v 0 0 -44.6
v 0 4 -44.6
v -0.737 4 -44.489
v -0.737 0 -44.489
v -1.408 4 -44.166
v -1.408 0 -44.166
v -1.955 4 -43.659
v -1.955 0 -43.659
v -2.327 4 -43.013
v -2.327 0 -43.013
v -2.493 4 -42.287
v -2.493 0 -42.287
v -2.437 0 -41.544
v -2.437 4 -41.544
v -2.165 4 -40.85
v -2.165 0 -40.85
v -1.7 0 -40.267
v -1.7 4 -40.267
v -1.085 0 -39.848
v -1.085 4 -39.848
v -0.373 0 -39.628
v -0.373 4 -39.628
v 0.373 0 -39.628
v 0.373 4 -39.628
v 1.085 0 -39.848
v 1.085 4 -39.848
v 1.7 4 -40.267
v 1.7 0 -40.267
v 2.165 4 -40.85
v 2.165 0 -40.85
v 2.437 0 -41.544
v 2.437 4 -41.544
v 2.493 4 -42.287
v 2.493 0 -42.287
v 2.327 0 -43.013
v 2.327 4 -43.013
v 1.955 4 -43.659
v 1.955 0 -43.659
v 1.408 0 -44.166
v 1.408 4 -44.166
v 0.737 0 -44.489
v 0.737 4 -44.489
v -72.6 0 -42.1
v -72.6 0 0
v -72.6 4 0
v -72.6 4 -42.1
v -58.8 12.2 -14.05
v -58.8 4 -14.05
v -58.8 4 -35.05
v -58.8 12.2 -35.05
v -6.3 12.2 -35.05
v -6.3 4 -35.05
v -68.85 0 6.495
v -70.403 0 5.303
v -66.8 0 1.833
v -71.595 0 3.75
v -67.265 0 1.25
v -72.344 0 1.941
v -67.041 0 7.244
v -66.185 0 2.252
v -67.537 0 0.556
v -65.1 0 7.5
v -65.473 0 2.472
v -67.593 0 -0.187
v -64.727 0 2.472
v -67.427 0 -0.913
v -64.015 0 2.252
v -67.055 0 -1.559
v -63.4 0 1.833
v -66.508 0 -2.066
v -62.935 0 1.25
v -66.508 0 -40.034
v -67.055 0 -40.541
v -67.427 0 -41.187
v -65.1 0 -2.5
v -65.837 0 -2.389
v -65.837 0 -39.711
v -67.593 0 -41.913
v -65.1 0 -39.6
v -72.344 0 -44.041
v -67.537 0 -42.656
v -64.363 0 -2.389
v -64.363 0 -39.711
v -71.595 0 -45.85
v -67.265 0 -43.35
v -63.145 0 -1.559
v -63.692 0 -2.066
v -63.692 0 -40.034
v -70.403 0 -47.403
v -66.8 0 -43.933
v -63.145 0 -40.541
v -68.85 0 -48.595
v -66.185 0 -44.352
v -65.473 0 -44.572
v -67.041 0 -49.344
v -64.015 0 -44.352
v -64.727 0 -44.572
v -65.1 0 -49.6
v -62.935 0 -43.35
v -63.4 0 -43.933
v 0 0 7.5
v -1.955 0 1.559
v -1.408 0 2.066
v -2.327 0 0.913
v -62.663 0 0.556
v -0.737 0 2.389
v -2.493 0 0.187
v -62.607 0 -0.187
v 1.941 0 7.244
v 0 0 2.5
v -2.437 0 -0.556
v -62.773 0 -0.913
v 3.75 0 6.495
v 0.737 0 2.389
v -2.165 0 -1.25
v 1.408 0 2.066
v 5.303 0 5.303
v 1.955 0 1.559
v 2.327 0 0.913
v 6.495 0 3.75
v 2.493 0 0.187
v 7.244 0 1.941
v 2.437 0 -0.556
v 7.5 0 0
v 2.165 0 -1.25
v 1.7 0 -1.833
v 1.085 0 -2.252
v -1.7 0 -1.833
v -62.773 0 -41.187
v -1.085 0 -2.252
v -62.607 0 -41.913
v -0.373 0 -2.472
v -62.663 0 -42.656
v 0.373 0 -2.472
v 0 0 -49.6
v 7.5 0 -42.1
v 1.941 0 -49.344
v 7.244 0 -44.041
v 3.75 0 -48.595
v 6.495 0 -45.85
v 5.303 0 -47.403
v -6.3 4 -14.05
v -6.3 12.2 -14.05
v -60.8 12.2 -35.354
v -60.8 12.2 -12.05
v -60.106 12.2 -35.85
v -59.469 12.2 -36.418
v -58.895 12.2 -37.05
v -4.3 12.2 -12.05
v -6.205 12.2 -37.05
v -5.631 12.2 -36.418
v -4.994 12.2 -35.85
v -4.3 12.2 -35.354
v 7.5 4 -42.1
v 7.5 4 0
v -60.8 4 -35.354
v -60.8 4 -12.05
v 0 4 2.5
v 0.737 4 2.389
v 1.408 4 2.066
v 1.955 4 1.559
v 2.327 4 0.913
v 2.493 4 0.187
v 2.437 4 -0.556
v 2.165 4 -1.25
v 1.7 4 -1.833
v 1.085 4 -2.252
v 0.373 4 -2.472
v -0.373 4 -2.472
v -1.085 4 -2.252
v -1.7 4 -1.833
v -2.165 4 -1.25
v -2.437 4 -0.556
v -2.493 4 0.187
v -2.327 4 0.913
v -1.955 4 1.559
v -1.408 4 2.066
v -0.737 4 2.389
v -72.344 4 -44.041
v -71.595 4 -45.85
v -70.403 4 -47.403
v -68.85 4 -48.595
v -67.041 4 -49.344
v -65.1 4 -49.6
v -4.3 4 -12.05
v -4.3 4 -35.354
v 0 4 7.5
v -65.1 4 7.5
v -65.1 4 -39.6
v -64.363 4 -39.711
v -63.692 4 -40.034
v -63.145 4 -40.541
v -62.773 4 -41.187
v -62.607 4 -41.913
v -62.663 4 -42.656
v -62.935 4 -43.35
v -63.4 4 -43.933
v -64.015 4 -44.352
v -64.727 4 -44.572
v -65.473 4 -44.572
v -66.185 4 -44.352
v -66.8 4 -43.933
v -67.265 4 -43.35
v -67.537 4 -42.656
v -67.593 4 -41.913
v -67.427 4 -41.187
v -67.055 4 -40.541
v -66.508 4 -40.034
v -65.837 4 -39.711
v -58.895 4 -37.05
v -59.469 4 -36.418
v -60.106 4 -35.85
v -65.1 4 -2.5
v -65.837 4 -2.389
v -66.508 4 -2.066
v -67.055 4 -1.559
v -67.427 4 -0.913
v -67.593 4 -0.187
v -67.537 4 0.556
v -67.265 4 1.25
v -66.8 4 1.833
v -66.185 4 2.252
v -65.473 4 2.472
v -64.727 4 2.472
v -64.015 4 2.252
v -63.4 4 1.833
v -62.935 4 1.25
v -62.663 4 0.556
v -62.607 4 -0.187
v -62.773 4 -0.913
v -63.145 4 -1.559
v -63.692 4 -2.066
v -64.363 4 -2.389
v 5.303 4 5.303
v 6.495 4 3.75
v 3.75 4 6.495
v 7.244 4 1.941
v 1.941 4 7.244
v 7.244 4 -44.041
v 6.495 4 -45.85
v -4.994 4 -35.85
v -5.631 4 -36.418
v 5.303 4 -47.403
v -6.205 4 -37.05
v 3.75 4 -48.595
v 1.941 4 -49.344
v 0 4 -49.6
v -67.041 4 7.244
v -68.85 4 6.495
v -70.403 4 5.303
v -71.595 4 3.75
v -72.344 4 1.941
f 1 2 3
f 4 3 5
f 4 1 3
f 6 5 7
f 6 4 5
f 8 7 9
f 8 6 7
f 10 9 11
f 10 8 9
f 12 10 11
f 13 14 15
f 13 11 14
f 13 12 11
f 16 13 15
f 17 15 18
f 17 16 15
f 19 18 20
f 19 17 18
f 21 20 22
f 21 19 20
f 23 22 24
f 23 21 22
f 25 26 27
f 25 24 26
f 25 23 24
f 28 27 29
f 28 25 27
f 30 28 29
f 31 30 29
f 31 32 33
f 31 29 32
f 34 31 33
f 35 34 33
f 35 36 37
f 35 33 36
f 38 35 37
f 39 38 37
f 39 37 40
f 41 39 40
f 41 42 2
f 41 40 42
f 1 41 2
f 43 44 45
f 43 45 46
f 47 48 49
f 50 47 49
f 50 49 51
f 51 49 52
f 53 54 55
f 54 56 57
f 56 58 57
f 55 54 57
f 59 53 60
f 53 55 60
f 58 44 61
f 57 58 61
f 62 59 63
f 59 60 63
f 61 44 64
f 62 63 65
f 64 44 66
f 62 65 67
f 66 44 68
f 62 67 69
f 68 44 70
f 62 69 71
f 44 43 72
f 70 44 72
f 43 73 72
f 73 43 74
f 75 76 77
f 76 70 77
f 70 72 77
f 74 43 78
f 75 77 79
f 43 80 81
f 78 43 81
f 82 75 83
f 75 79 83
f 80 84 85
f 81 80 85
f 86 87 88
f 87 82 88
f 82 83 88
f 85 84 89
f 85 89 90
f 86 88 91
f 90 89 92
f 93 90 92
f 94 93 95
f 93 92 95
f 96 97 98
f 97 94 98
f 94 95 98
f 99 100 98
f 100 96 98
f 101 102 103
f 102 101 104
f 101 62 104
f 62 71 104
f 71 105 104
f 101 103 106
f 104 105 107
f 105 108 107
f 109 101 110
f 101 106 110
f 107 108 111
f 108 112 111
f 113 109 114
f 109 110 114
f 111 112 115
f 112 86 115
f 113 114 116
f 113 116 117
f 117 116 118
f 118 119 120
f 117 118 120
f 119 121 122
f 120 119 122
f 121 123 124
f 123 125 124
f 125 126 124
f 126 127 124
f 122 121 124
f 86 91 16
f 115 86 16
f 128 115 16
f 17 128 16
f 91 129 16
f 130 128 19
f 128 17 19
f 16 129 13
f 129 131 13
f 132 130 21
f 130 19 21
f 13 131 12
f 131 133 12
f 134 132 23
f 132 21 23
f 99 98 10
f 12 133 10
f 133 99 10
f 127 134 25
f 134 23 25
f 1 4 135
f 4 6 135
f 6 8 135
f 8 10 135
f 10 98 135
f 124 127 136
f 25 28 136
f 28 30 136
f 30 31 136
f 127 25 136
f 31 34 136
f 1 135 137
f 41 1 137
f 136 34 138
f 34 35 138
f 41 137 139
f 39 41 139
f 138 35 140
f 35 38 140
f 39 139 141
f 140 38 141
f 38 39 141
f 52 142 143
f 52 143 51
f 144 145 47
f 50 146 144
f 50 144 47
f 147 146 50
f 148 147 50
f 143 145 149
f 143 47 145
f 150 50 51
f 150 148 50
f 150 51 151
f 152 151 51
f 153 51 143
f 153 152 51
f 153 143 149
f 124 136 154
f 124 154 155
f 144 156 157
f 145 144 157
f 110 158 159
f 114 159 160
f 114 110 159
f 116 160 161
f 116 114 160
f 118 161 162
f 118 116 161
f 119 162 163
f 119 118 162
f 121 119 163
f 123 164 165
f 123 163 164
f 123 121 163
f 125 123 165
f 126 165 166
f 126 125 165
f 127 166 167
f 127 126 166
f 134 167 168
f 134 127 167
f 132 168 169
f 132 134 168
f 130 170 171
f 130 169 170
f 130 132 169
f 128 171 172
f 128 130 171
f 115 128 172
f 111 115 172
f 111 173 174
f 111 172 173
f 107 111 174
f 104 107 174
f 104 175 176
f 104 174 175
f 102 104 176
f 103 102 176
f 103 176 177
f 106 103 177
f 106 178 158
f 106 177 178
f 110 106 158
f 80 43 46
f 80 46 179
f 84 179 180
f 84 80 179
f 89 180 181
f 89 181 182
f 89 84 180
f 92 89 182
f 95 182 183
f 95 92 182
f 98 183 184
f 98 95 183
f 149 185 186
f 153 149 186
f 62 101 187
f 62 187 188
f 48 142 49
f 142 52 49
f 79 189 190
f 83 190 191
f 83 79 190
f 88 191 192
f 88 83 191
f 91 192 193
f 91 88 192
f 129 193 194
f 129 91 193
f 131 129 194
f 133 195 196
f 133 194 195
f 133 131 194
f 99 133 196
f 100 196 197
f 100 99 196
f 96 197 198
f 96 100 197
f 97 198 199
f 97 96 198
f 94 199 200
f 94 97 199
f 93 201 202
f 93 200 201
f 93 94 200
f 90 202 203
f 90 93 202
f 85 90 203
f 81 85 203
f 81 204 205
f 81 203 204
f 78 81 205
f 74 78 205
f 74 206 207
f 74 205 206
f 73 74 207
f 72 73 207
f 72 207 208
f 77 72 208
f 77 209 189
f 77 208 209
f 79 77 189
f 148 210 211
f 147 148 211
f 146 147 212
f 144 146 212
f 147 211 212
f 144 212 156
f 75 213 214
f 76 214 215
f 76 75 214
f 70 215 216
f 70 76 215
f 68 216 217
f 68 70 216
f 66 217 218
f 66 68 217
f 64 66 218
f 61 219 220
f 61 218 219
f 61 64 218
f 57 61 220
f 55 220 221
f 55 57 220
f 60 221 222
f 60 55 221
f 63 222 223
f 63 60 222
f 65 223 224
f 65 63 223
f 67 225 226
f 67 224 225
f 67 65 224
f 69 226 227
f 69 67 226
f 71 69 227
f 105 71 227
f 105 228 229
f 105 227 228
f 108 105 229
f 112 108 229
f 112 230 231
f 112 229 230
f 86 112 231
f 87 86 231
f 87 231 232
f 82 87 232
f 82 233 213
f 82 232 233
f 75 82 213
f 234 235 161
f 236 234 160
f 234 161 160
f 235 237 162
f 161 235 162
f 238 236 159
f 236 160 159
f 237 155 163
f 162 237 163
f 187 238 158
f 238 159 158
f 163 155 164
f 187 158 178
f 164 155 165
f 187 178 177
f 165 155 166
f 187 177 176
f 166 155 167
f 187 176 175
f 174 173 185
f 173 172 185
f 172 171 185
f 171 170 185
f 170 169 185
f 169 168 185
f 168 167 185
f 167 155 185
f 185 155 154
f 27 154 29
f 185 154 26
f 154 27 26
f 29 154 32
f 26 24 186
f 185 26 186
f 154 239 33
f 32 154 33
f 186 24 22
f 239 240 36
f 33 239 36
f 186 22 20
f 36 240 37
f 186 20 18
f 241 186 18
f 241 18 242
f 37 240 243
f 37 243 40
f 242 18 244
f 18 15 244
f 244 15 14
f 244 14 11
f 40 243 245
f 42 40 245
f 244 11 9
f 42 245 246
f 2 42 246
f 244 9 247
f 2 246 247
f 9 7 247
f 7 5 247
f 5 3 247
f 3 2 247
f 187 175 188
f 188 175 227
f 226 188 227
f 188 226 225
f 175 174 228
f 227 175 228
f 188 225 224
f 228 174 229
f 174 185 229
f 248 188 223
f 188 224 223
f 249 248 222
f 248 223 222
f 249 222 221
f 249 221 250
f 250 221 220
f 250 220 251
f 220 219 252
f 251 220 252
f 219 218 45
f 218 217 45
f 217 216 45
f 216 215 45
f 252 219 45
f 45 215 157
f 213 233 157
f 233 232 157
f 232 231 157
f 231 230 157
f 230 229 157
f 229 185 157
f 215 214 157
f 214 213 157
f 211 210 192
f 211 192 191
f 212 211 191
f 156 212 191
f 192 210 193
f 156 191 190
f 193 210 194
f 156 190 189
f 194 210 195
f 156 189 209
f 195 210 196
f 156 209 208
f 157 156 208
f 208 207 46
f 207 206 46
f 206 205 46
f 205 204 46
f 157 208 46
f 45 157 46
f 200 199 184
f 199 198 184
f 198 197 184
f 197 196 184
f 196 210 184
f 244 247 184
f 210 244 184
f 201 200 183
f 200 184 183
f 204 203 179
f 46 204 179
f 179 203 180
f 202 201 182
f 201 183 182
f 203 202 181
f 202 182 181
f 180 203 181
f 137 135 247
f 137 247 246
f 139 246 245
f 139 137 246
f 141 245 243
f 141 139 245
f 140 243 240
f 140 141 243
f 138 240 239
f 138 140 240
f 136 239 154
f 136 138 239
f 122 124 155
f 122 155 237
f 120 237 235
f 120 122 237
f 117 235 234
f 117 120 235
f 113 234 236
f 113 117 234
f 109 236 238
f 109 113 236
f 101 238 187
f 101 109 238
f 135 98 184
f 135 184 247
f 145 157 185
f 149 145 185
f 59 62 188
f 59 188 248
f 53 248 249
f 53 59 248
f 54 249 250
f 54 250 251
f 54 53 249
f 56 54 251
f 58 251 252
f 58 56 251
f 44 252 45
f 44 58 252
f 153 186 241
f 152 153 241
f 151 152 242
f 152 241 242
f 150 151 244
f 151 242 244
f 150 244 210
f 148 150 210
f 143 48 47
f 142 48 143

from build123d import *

# Parameters (mm, degrees)
EXTRUDE_1_DEPTH     = 4
SKETCH_1_3_R        = 2.5
CUT_EXTRUDE_1_DEPTH = 5
SKETCH_1_4_W        = 52.5
SKETCH_1_4_H        = 21
EXTRUDE_2_DEPTH     = 12.2


with BuildPart() as part:
    # Эскиз1 → Бобышка-Вытянуть1 (new body)
    with BuildSketch(Plane(origin=(0, 0, 0), x_dir=(1, 0, 0), z_dir=(0, 1, 0))):
        with BuildLine():
            Line((-65.1, 49.6), (0, 49.6))
            ThreePointArc((0, 49.6), (5.303300859, 47.403300859), (7.5, 42.1))
            Line((7.5, 42.1), (7.5, 0))
            ThreePointArc((7.5, 0), (5.303300859, -5.303300859), (0, -7.5))
            Line((0, -7.5), (-65.1, -7.5))
            ThreePointArc((-65.1, -7.5), (-70.403300859, -5.303300859), (-72.6, 0))
            Line((-72.6, 0), (-72.6, 42.1))
            ThreePointArc((-72.6, 42.1), (-70.403300859, 47.403300859), (-65.1, 49.6))
        make_face()
    extrude(amount=EXTRUDE_1_DEPTH)

    # Эскиз1<3> → Вырез-Вытянуть1 (cut)
    with BuildSketch(Plane(origin=(0, 0, 0), x_dir=(1, 0, 0), z_dir=(0, 1, 0))):
        with Locations((-65.1, 42.1)):
            Circle(SKETCH_1_3_R)
        with Locations((0, 42.1)):
            Circle(SKETCH_1_3_R)
        Circle(SKETCH_1_3_R)
        with Locations((-65.1, 0)):
            Circle(SKETCH_1_3_R)
    extrude(amount=CUT_EXTRUDE_1_DEPTH, mode=Mode.SUBTRACT)

    # Эскиз1<4> → Бобышка-Вытянуть2 (add)
    with BuildSketch(Plane(origin=(0, 0, 0), x_dir=(1, 0, 0), z_dir=(0, 1, 0))):
        with BuildLine():
            Line((-6.204635364, 37.05), (-58.895364636, 37.05))
            ThreePointArc((-58.895364636, 37.05), (-59.779658065, 36.125557625), (-60.8, 35.35389001))
            Line((-60.8, 35.35389001), (-60.8, 12.05))
            Line((-60.8, 12.05), (-4.3, 12.05))
            Line((-4.3, 12.05), (-4.3, 35.35389001))
            ThreePointArc((-4.3, 35.35389001), (-5.320341935, 36.125557625), (-6.204635364, 37.05))
        make_face()
        with Locations((-32.55, 24.55)):
            Rectangle(SKETCH_1_4_W, SKETCH_1_4_H, mode=Mode.SUBTRACT)
    extrude(amount=EXTRUDE_2_DEPTH)


solid = part.part
